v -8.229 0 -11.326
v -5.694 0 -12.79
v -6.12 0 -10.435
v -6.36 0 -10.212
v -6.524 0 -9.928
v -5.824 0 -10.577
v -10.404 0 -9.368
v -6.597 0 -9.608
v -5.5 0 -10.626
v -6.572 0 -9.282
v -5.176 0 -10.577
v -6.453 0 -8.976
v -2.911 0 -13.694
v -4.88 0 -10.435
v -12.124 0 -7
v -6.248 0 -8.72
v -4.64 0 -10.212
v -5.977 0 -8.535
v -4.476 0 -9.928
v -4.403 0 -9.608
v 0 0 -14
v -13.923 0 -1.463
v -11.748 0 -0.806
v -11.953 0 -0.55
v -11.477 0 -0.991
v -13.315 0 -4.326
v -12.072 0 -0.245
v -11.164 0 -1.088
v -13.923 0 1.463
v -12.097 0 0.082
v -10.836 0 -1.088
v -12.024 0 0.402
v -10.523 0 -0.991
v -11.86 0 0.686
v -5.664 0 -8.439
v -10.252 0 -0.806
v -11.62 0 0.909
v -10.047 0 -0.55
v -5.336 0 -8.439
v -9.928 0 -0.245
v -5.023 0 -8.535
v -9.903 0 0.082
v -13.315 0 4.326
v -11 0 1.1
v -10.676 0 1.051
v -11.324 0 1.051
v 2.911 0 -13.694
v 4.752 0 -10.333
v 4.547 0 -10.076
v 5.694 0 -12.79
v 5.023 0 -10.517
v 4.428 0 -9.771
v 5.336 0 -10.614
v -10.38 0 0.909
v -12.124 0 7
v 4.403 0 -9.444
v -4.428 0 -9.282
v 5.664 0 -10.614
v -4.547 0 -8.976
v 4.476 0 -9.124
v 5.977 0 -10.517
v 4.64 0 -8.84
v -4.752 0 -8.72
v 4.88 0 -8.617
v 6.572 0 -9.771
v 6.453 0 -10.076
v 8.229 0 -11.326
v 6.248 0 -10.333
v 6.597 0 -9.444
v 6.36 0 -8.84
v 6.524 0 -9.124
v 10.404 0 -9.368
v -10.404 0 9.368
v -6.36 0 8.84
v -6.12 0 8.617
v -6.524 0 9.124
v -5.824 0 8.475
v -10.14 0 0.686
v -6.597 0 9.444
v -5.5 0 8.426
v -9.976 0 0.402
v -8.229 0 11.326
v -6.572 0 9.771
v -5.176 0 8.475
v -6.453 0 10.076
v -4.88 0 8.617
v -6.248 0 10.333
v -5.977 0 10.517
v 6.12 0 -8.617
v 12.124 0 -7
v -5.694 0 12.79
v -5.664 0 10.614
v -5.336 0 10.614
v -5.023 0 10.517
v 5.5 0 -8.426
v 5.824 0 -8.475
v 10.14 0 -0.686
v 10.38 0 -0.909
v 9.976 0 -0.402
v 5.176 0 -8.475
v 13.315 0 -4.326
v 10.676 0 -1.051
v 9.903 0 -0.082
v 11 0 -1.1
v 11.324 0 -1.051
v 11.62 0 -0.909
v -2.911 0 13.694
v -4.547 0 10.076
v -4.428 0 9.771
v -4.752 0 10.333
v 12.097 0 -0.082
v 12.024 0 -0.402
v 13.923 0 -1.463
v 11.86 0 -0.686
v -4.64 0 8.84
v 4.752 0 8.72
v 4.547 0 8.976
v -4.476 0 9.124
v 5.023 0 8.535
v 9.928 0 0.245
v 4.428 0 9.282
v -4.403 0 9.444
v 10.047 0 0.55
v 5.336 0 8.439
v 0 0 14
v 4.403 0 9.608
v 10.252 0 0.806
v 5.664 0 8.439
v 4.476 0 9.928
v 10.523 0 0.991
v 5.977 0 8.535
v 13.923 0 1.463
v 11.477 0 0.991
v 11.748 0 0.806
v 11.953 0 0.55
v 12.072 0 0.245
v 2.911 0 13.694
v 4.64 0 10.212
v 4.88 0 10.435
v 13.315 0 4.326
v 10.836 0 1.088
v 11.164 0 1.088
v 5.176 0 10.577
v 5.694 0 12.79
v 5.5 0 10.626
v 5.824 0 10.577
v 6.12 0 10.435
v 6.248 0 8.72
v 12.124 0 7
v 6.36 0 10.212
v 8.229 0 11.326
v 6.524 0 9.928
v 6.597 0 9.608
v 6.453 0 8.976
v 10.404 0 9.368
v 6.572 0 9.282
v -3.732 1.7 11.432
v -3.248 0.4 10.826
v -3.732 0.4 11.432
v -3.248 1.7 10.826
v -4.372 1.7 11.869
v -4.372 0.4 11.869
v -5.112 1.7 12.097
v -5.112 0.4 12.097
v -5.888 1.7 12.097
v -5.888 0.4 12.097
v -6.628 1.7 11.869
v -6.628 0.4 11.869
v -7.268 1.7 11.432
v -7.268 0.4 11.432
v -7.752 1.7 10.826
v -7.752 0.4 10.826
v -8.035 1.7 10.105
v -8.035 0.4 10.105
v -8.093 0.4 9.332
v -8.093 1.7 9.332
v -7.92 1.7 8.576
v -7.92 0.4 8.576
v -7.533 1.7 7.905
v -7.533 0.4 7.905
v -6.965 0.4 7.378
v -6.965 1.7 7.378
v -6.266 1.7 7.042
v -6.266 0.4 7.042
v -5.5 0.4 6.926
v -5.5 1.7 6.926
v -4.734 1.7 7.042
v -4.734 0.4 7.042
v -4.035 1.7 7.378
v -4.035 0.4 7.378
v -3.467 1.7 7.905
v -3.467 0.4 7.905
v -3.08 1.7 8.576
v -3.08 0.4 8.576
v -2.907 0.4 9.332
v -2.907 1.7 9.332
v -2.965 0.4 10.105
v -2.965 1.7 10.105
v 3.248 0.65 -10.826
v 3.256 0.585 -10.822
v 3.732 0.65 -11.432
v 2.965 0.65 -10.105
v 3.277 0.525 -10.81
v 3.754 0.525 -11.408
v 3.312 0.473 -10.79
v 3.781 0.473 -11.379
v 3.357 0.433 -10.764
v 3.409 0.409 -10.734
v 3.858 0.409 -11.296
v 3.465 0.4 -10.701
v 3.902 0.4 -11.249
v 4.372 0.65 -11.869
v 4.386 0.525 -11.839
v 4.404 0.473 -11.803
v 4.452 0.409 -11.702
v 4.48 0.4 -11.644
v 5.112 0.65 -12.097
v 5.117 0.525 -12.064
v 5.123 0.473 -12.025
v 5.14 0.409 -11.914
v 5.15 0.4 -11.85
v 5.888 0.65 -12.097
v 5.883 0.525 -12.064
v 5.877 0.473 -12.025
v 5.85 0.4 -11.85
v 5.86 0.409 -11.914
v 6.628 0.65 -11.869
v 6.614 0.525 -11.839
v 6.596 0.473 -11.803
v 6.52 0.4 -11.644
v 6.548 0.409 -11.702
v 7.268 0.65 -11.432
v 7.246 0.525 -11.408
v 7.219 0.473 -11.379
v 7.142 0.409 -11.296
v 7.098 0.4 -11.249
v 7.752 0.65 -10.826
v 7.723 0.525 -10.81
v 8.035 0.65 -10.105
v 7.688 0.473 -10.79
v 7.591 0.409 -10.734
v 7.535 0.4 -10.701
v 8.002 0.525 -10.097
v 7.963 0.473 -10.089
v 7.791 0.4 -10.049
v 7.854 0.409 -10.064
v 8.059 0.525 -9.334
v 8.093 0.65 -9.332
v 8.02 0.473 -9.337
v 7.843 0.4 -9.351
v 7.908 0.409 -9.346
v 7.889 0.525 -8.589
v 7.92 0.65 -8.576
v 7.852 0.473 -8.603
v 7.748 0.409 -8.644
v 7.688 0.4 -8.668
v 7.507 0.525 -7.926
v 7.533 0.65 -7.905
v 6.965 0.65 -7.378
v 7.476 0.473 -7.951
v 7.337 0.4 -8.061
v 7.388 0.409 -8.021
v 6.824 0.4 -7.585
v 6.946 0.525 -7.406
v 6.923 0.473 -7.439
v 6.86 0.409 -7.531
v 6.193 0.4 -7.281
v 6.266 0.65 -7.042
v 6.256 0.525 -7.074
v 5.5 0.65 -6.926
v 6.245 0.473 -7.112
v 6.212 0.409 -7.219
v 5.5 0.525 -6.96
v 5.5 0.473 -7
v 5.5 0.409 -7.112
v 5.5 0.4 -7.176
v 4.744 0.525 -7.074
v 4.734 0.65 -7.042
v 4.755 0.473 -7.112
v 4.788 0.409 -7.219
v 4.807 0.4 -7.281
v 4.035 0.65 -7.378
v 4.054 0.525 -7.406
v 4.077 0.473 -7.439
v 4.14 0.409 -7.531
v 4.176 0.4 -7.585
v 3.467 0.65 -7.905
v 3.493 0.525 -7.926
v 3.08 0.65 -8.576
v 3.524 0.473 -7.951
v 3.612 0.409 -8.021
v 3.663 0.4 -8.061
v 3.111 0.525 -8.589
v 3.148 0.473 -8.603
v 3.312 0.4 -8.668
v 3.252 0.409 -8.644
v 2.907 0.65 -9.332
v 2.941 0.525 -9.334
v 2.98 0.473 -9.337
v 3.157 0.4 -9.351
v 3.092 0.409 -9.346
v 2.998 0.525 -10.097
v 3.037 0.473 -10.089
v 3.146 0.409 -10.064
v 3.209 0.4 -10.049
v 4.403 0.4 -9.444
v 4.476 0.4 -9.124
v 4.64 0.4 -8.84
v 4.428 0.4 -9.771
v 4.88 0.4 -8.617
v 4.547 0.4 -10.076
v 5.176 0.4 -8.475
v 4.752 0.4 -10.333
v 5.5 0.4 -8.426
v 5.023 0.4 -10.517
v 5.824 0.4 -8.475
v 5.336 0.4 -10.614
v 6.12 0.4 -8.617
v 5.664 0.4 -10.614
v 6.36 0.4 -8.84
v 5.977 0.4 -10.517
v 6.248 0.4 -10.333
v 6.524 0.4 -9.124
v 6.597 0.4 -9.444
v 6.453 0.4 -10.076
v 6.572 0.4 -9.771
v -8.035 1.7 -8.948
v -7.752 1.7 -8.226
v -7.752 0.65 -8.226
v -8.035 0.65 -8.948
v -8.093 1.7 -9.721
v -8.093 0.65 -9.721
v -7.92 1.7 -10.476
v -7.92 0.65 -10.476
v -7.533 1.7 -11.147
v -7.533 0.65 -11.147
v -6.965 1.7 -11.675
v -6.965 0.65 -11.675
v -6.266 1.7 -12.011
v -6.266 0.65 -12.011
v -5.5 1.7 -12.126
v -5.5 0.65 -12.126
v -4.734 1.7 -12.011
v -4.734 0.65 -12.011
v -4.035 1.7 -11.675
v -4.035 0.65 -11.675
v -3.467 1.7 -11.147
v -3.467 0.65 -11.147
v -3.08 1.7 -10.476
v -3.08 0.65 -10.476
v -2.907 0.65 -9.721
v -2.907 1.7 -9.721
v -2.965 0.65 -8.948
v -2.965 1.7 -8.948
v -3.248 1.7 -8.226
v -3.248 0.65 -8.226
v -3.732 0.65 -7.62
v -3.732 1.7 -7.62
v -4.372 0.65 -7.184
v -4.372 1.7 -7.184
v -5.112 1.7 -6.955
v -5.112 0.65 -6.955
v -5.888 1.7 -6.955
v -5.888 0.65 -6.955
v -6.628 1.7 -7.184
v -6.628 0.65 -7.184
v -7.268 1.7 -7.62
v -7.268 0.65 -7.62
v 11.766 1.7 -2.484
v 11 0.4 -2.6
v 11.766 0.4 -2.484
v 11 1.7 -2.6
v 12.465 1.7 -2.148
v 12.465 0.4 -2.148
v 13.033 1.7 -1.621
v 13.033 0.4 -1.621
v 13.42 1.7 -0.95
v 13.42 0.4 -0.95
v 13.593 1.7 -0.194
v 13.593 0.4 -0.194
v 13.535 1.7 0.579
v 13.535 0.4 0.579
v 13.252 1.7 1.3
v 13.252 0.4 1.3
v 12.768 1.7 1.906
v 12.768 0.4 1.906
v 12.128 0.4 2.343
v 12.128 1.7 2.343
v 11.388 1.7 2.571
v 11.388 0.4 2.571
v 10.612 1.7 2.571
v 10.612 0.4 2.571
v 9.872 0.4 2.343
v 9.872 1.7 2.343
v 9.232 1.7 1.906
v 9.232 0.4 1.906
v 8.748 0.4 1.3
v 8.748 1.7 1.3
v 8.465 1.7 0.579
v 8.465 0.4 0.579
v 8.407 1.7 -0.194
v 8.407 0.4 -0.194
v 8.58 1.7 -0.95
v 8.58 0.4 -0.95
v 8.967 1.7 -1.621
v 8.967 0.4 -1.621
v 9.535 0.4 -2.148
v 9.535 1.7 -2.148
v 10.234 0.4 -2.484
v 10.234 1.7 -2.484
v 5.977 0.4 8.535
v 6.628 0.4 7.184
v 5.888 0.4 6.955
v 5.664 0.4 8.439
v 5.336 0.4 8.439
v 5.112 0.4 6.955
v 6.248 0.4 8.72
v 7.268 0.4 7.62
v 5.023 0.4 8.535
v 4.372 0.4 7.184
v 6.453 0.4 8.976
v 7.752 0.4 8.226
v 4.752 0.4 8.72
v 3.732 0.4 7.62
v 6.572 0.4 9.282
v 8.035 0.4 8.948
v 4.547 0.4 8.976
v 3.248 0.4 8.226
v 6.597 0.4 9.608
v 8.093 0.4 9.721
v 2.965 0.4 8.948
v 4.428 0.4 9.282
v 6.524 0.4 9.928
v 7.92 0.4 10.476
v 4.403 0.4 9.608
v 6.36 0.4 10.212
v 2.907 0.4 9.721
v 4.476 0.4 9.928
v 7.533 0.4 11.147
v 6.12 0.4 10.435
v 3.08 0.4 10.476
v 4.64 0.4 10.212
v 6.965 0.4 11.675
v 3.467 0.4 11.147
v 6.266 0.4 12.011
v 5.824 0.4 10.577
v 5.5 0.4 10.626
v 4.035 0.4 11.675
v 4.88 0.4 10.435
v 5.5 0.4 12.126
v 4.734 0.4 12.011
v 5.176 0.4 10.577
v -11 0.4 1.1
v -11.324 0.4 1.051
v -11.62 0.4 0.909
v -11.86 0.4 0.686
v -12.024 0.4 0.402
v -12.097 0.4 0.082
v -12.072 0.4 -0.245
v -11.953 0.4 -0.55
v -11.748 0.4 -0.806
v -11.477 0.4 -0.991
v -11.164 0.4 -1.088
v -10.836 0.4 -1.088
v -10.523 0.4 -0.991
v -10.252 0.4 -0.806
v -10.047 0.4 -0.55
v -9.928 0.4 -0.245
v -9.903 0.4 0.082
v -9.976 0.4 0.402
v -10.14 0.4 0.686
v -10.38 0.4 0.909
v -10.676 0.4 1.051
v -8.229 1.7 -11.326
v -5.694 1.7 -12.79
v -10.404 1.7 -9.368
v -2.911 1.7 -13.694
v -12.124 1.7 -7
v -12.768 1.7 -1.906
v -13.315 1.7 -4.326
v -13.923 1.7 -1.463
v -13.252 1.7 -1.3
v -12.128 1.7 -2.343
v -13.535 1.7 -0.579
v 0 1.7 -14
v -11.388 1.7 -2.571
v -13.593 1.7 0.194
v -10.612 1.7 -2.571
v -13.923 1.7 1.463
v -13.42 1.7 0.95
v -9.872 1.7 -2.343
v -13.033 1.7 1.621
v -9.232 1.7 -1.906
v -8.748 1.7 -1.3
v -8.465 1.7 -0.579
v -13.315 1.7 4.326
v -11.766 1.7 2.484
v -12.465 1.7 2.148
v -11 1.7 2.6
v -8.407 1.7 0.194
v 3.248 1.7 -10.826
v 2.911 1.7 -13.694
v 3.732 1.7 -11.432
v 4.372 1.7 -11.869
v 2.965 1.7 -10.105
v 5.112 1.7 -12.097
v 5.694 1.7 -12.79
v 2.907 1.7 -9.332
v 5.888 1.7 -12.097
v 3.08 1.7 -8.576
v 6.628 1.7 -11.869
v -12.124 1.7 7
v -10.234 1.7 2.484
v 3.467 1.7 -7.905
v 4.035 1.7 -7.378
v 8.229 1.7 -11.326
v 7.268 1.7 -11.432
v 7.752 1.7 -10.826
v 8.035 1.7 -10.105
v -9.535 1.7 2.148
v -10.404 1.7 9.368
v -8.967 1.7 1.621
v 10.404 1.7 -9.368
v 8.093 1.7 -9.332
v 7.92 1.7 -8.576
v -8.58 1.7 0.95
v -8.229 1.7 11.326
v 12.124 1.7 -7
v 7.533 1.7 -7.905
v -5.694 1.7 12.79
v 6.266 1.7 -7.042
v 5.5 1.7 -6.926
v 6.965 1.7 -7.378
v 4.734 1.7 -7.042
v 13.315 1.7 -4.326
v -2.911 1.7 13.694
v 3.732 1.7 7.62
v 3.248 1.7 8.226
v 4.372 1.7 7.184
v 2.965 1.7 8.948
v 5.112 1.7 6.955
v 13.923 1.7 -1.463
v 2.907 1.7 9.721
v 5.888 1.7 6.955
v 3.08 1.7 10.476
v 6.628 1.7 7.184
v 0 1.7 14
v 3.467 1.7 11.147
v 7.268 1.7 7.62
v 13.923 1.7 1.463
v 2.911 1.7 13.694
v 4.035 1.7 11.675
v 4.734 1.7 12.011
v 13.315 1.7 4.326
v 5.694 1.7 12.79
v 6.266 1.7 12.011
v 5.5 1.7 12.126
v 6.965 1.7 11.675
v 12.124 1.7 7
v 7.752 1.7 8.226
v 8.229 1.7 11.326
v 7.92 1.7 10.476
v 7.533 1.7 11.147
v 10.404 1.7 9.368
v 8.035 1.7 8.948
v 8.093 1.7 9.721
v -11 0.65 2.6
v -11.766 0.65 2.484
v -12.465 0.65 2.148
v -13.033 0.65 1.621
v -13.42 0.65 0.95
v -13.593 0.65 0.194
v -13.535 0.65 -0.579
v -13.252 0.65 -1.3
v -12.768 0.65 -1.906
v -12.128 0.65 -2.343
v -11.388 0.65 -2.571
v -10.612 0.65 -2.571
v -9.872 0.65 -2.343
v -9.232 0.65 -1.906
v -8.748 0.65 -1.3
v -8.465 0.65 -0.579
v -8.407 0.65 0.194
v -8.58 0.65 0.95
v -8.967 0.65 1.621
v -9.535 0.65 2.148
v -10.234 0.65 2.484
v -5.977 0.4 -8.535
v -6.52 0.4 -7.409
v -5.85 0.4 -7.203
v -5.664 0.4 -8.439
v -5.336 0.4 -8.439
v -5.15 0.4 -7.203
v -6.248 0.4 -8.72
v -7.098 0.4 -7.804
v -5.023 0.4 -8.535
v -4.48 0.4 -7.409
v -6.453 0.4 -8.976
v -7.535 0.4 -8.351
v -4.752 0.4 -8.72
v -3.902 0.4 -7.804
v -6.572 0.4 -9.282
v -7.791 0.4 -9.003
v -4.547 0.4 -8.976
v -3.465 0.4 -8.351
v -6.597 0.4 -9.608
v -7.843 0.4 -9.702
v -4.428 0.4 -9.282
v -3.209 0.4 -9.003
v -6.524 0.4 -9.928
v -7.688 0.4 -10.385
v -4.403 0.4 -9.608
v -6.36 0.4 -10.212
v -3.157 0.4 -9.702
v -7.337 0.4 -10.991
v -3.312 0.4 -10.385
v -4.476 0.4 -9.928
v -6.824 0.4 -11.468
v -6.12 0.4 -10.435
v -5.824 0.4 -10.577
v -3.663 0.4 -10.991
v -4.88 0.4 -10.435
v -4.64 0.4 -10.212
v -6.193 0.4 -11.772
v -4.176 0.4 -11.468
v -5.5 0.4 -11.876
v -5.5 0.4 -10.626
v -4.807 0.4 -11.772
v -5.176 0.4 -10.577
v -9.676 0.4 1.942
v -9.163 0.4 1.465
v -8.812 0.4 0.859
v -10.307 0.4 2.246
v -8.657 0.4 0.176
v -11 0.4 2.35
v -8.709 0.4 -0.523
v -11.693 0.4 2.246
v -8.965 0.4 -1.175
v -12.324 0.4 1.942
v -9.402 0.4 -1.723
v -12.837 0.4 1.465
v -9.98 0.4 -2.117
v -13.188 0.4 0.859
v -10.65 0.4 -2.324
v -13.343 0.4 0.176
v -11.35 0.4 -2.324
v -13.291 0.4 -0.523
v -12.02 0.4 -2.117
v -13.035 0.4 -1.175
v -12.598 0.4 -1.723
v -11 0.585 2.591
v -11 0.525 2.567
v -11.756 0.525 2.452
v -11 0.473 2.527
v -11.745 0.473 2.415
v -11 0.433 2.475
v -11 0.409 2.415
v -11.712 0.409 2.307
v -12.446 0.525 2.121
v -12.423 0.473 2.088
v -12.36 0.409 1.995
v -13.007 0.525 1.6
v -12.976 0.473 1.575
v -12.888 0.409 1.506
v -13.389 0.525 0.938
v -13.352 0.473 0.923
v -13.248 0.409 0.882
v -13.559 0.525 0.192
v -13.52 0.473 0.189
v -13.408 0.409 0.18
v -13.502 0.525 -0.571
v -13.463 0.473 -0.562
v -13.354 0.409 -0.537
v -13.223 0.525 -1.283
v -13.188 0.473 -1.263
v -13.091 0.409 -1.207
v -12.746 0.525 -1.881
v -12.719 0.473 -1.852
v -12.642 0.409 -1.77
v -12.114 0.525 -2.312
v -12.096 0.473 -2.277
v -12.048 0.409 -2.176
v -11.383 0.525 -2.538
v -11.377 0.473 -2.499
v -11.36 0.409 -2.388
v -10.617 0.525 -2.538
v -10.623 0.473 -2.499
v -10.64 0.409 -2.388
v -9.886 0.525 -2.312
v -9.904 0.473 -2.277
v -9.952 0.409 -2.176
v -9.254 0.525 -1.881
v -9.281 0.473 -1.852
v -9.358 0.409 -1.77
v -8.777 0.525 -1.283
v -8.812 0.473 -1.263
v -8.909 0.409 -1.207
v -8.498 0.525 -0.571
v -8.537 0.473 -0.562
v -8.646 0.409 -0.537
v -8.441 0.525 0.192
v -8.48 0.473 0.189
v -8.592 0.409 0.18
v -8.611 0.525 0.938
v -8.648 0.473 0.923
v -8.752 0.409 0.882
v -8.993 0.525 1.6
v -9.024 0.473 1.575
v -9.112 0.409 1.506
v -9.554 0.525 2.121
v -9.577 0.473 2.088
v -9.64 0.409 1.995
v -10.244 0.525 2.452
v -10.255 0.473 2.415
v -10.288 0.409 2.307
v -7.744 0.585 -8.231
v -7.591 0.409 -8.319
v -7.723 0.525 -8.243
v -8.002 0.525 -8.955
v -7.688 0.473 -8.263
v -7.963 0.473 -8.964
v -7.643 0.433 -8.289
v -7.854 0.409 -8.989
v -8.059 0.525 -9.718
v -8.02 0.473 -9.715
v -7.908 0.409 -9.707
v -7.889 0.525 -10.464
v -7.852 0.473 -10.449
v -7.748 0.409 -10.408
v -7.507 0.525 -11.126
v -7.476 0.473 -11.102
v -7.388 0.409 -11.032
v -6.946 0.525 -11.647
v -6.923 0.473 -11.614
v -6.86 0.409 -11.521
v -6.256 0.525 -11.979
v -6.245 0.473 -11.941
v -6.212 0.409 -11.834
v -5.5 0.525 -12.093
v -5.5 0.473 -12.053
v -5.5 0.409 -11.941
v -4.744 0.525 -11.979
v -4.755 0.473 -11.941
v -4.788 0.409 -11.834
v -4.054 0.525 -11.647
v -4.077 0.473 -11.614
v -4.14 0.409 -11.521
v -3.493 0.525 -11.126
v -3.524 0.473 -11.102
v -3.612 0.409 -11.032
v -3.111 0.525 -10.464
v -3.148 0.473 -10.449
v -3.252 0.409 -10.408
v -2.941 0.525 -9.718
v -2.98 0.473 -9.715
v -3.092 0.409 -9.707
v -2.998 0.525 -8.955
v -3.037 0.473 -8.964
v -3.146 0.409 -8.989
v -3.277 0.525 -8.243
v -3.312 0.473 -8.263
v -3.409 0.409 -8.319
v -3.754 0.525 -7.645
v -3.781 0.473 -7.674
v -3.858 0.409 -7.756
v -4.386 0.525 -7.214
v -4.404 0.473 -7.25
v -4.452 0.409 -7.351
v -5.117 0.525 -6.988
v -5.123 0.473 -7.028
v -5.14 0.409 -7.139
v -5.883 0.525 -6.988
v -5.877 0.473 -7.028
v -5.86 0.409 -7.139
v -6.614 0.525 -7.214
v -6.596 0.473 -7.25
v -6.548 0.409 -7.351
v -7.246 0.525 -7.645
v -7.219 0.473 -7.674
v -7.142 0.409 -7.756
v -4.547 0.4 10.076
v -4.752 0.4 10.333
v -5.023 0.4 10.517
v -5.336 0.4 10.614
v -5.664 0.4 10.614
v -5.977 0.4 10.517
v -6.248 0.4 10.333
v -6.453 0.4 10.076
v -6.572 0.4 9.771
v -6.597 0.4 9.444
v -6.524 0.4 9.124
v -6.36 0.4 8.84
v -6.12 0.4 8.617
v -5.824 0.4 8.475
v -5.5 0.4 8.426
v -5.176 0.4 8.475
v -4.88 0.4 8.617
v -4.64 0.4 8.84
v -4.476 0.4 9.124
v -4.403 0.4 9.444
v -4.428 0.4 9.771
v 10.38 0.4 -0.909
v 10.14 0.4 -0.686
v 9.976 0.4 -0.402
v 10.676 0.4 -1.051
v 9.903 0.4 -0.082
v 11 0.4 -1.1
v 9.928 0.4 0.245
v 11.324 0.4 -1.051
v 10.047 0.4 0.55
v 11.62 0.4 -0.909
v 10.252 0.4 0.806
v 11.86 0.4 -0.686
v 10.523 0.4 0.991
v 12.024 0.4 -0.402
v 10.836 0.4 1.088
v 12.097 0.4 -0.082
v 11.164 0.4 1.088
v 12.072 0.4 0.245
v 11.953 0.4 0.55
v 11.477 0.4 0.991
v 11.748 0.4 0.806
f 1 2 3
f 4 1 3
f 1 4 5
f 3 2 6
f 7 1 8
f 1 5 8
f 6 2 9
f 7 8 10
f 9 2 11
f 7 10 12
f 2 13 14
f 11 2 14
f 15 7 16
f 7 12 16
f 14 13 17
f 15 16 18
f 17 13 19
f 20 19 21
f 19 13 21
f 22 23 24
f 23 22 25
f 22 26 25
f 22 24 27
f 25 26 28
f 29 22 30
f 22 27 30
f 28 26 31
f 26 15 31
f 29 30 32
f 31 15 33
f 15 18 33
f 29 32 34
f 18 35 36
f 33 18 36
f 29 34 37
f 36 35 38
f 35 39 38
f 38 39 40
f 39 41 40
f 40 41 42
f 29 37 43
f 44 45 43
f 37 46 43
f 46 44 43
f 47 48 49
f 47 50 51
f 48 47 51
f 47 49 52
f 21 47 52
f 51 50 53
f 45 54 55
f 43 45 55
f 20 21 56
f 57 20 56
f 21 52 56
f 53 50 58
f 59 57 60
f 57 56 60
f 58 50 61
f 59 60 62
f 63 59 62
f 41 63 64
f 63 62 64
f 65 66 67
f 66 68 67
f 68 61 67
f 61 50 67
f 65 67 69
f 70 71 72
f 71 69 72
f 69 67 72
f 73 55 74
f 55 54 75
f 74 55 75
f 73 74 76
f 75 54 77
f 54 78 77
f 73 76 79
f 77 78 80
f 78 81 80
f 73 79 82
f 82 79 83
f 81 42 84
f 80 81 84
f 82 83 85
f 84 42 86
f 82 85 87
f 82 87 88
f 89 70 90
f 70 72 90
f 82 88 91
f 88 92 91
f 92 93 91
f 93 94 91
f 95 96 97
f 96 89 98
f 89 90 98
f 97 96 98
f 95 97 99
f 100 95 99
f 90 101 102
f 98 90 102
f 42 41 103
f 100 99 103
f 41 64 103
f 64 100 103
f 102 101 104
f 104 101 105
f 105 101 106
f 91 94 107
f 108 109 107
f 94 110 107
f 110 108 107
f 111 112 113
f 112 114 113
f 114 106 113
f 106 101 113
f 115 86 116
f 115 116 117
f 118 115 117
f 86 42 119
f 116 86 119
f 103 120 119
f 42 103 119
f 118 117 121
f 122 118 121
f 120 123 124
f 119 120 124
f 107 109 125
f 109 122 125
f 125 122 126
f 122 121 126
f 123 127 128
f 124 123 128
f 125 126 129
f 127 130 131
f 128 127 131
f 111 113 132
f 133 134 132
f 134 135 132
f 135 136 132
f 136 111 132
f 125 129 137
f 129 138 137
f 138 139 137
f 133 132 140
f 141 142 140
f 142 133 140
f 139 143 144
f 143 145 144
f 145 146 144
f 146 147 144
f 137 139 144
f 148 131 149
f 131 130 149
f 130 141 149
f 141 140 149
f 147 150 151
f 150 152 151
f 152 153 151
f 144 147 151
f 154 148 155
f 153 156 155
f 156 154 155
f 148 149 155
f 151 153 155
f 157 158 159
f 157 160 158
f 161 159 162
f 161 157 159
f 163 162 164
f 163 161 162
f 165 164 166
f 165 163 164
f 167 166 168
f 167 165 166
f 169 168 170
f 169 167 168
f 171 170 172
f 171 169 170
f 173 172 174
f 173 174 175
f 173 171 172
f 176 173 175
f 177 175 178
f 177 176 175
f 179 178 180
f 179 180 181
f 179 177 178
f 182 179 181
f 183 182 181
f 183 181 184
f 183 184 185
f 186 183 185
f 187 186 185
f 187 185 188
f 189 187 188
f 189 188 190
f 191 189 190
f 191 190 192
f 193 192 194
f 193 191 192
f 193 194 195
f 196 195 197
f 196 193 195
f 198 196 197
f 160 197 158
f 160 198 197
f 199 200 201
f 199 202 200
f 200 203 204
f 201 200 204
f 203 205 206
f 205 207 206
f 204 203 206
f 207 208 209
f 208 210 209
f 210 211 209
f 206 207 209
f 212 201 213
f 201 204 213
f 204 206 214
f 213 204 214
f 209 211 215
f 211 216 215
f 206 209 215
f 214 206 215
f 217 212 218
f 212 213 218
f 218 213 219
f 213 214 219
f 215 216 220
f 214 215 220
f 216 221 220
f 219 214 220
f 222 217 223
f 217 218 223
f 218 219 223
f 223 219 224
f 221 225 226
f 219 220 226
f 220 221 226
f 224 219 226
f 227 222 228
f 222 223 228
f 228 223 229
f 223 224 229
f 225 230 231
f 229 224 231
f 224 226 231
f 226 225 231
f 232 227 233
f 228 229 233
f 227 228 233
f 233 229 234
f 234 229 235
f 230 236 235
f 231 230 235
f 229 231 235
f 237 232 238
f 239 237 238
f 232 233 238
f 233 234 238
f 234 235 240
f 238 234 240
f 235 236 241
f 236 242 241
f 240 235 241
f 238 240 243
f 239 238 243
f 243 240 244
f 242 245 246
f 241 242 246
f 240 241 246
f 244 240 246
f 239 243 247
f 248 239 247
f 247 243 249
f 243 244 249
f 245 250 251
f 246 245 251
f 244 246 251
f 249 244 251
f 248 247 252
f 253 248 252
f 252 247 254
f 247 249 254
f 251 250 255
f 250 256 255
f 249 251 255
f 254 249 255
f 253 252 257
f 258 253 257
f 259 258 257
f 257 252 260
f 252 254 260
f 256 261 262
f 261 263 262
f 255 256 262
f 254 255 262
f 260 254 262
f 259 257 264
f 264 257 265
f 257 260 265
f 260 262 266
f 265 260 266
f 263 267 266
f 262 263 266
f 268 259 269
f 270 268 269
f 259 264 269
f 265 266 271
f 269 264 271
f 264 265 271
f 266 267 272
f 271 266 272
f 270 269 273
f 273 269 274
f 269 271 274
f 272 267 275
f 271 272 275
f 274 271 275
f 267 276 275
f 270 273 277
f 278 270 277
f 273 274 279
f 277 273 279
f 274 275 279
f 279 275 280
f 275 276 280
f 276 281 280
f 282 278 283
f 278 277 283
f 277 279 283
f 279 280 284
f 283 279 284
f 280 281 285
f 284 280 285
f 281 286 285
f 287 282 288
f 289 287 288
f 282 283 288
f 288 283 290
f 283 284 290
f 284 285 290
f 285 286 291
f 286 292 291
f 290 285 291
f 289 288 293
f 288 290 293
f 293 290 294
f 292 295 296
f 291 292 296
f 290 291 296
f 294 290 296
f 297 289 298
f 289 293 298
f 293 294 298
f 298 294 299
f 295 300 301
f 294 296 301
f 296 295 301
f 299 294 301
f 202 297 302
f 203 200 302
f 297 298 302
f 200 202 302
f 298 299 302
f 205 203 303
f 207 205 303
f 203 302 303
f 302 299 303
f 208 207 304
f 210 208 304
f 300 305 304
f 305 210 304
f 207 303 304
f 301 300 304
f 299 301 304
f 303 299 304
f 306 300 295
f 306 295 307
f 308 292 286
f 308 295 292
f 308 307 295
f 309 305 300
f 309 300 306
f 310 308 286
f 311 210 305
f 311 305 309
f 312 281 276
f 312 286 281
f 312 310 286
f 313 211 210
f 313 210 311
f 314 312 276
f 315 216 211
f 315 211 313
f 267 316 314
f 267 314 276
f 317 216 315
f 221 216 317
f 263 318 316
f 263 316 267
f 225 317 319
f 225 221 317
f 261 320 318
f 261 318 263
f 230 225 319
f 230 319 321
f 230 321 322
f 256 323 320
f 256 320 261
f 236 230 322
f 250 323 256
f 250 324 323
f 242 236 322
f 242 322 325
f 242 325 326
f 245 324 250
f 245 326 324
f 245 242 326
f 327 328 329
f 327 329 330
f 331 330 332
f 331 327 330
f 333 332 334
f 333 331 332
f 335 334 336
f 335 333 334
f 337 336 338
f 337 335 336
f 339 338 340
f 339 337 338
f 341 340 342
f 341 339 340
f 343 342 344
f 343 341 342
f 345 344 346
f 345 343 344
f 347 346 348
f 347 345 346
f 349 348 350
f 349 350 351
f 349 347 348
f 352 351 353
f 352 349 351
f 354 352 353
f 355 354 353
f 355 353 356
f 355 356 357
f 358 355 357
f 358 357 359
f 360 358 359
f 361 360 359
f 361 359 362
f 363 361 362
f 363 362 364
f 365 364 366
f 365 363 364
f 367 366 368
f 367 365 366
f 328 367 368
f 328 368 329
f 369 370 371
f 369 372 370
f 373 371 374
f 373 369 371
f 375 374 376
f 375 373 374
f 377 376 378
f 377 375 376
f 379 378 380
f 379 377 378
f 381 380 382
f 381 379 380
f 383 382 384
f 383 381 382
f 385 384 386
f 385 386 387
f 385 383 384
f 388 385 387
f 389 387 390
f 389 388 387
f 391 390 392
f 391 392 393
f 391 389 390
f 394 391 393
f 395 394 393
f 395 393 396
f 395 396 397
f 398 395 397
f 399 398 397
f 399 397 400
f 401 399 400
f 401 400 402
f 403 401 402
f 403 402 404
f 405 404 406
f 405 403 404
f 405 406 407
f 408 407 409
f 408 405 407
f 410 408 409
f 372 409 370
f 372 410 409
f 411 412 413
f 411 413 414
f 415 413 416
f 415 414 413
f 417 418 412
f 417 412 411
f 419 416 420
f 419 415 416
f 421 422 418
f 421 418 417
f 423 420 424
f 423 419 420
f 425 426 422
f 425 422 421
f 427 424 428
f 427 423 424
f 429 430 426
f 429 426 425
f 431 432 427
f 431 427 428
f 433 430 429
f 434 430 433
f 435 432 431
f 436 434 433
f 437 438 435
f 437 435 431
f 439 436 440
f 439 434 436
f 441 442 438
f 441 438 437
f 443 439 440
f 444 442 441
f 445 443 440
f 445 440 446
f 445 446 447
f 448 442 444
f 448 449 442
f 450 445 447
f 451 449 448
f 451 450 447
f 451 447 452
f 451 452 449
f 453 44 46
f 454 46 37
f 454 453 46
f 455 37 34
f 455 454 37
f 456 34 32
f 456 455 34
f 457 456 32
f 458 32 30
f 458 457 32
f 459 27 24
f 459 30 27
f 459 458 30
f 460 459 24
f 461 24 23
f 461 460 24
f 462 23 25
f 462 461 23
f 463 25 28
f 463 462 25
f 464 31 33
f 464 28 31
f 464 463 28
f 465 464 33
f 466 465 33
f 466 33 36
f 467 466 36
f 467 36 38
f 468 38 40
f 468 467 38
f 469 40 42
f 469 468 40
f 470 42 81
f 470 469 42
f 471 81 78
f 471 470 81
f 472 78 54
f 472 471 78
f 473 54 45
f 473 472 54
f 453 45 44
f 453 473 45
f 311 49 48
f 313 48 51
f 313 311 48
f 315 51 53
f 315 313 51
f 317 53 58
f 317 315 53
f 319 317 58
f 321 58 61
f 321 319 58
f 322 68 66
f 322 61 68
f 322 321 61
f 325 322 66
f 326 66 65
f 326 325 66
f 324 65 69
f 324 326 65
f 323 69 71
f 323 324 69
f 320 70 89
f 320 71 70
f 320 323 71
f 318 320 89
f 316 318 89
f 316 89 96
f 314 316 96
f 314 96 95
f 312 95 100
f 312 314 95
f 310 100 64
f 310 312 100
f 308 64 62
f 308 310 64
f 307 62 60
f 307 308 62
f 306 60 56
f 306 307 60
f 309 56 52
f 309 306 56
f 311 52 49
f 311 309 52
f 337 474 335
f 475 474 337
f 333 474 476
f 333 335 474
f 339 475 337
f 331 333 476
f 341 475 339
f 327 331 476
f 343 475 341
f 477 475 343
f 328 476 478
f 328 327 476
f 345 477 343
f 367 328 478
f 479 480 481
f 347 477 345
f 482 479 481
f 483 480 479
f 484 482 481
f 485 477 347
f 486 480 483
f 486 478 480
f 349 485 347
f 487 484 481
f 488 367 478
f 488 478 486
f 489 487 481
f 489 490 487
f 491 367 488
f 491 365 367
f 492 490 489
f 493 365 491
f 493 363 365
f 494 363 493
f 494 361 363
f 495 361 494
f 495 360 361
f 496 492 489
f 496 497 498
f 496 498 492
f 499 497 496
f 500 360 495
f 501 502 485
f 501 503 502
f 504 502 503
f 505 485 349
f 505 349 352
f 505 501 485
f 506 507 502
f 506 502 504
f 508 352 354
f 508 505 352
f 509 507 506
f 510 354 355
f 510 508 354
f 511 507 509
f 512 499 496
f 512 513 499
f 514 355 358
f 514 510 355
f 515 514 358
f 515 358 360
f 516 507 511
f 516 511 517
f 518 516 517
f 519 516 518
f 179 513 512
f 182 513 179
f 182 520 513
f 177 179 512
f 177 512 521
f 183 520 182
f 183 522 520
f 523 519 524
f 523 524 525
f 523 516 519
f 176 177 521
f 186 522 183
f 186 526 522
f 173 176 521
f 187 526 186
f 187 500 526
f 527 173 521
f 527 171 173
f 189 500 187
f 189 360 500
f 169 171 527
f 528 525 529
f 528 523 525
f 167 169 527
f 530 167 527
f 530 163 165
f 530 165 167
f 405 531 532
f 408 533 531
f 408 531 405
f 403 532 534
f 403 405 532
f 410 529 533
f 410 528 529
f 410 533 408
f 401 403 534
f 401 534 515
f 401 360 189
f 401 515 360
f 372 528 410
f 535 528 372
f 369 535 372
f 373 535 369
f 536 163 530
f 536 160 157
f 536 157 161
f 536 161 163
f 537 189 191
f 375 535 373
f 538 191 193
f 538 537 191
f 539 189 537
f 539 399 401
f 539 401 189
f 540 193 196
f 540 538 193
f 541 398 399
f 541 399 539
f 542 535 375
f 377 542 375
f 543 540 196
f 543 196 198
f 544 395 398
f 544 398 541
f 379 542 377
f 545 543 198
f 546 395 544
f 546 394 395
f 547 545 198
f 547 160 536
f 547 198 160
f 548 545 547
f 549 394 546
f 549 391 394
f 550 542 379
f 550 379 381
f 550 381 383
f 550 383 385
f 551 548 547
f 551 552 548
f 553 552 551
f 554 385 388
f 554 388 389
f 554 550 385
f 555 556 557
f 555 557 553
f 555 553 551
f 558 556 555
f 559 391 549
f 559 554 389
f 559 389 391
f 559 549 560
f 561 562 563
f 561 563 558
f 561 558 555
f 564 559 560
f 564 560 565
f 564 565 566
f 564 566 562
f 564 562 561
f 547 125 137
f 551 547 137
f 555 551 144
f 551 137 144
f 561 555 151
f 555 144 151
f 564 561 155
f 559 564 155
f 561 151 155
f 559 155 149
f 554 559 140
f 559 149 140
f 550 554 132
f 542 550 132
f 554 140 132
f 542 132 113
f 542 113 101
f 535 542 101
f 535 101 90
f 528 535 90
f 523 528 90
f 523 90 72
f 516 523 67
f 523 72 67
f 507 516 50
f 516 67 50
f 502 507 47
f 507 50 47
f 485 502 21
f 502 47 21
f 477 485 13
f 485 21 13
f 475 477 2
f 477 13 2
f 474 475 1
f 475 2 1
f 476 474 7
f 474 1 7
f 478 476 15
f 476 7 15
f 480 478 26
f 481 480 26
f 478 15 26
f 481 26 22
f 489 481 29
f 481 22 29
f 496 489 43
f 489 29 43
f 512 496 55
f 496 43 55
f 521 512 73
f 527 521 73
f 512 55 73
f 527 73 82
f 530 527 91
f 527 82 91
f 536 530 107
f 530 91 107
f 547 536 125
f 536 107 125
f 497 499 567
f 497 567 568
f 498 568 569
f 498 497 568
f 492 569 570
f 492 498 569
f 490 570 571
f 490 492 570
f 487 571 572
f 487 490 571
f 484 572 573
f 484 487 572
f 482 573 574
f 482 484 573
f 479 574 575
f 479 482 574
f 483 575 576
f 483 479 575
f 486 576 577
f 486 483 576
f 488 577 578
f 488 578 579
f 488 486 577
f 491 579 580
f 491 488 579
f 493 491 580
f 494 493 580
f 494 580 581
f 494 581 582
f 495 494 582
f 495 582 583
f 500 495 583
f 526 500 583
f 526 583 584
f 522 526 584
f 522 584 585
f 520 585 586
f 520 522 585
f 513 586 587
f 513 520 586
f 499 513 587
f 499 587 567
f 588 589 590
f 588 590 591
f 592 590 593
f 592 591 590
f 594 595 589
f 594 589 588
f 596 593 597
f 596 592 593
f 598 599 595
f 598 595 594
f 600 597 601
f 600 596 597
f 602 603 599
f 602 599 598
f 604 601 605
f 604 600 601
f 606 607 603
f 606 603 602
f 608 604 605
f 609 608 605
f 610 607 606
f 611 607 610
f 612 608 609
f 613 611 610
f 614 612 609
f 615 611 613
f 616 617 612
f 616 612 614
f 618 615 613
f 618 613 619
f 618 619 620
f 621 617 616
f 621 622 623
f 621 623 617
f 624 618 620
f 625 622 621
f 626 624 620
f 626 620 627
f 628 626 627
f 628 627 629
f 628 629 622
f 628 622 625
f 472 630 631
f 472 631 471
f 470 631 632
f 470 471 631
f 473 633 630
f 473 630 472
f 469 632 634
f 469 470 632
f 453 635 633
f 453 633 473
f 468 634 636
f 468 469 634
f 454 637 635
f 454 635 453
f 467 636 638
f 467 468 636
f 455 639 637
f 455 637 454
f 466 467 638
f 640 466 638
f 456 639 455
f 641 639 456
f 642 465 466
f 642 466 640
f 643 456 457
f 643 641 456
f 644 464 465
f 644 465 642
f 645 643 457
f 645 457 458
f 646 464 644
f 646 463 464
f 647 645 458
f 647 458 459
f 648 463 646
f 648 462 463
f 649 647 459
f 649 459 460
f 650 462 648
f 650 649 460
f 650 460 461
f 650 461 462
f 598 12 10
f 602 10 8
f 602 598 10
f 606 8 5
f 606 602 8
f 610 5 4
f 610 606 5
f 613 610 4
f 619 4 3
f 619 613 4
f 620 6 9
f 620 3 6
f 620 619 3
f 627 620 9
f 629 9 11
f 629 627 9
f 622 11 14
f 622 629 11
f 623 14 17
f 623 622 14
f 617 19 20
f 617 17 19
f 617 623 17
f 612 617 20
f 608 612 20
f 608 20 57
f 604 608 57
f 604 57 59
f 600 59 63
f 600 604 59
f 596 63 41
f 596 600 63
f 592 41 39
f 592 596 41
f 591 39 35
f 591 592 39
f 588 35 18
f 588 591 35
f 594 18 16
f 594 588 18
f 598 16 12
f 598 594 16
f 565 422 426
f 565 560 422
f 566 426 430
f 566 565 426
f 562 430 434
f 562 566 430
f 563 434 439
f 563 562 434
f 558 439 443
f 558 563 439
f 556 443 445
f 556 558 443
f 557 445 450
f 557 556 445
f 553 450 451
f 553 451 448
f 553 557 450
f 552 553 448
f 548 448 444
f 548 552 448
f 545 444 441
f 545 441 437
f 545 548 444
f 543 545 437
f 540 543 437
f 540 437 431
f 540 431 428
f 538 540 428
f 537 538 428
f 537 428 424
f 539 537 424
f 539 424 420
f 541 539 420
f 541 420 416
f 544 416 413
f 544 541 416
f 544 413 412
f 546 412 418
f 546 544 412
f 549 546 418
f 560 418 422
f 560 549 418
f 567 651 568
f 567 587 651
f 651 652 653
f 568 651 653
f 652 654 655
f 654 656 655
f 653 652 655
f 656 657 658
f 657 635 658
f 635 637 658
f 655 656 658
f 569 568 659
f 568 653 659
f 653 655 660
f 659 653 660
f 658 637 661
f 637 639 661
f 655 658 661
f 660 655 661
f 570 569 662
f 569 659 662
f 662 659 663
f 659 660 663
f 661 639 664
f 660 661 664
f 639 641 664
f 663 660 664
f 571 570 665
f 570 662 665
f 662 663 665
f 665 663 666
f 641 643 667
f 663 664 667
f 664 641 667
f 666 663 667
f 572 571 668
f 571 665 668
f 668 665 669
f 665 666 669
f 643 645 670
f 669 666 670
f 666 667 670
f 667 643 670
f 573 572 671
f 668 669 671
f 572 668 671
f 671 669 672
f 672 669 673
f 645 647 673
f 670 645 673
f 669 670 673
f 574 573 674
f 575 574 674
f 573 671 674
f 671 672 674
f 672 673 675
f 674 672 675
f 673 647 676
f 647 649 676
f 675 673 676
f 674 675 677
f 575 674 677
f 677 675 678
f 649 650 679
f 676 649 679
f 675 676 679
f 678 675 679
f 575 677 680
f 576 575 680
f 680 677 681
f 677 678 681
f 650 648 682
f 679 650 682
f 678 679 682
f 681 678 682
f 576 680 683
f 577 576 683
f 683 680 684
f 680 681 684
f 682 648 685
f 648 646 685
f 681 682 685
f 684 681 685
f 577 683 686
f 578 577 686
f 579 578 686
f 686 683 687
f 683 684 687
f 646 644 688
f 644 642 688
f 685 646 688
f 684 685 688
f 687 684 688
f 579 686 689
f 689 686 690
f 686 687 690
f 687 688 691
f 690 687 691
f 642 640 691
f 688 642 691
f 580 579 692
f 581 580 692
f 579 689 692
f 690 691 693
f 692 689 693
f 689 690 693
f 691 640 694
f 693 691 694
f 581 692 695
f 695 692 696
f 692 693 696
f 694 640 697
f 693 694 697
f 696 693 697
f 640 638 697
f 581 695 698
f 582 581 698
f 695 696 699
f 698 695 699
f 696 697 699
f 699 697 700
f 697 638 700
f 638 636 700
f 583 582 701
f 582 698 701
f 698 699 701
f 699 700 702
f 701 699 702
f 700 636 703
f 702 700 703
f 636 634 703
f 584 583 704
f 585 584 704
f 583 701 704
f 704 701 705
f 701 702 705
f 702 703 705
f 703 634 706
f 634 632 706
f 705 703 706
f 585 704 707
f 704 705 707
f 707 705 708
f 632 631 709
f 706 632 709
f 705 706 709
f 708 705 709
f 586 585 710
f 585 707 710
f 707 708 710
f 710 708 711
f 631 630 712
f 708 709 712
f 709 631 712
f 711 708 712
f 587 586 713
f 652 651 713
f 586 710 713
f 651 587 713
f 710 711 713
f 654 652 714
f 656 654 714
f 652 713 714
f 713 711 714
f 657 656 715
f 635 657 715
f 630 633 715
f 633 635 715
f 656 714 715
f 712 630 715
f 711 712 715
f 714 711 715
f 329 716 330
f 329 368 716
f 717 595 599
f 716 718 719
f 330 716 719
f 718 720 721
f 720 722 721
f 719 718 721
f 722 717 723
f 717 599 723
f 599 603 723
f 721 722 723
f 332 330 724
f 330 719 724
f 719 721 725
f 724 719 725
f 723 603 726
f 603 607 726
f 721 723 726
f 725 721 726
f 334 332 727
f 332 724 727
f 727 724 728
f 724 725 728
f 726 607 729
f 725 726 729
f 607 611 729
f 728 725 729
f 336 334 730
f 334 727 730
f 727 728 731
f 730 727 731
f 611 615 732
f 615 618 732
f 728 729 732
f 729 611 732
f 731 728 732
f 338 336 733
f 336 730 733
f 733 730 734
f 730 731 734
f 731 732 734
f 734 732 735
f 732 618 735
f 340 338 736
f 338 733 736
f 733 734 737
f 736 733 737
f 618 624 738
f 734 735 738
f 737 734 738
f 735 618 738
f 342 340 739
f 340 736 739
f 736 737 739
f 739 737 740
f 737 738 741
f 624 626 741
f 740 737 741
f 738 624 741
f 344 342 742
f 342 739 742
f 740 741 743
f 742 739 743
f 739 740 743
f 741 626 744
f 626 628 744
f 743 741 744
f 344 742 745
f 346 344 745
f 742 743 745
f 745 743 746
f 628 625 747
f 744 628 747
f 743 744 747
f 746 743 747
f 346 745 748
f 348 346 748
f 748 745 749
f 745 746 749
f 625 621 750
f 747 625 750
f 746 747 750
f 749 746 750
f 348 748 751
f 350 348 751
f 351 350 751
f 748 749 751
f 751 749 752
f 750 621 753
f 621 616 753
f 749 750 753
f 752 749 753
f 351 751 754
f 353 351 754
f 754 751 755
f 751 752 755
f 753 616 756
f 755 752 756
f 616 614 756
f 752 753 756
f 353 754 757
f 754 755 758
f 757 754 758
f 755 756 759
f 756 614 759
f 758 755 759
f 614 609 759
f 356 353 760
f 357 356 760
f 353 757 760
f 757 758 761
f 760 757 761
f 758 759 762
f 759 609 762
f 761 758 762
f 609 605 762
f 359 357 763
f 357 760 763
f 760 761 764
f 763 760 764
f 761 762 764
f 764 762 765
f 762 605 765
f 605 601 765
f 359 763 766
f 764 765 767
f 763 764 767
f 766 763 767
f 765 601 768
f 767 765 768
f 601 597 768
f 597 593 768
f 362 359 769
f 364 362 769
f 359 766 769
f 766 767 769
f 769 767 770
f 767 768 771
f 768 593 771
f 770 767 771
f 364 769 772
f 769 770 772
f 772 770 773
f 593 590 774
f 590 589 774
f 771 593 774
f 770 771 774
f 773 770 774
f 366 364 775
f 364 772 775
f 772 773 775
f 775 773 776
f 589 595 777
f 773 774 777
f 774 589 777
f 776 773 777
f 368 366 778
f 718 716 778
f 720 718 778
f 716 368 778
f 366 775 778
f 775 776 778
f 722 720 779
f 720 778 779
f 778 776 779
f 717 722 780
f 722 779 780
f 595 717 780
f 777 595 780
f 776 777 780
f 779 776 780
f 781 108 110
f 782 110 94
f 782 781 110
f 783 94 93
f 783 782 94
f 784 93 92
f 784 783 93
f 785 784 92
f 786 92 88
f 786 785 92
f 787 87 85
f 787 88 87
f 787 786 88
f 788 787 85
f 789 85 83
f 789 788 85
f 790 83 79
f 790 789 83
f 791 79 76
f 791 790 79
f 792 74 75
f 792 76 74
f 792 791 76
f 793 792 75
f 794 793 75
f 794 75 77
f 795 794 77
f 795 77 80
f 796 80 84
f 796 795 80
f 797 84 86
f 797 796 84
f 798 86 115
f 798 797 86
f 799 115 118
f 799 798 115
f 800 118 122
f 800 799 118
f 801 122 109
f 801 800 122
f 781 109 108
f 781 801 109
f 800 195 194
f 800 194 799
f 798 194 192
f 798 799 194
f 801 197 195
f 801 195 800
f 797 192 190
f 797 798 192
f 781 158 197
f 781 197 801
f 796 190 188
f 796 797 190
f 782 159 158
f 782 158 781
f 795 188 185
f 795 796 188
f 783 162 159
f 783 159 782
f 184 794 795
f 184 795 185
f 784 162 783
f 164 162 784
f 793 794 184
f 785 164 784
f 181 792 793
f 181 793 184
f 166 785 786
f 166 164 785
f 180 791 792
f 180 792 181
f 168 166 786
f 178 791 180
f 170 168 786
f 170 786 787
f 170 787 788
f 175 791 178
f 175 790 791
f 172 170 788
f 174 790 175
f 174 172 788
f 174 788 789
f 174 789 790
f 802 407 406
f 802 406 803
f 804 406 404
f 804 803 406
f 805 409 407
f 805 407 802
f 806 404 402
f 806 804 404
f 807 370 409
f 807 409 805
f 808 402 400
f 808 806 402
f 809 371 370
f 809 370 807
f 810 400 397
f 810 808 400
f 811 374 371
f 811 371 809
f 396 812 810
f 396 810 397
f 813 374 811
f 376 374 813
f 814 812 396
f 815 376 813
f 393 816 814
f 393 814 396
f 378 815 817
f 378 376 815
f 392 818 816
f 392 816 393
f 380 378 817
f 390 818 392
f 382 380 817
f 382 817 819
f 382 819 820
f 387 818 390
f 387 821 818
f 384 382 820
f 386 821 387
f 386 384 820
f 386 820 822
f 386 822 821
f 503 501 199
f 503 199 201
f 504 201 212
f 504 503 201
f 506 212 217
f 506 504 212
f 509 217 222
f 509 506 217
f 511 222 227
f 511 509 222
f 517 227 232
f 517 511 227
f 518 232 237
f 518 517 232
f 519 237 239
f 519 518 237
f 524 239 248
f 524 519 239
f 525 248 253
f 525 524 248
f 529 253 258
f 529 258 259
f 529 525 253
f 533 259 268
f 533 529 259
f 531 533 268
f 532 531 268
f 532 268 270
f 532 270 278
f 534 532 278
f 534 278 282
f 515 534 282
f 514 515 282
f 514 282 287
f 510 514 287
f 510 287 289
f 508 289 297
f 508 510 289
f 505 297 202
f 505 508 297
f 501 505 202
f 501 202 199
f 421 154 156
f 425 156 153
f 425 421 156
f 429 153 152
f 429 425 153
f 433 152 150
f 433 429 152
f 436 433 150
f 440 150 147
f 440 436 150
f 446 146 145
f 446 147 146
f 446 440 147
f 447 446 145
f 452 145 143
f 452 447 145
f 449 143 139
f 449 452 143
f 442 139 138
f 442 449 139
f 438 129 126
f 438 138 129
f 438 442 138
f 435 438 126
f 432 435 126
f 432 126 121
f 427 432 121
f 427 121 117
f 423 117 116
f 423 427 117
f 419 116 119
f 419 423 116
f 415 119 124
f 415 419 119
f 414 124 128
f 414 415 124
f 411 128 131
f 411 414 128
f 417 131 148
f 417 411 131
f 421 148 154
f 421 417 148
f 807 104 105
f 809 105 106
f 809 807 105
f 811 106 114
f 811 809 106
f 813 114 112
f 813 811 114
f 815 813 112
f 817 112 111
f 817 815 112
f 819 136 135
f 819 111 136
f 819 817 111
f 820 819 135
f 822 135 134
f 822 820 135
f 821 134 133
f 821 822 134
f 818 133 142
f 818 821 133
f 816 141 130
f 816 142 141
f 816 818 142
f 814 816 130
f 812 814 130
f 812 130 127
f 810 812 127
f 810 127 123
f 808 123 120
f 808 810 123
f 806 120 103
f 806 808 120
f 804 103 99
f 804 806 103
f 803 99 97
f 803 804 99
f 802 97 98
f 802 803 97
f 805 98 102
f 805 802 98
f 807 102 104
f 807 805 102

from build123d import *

# Parameters (mm, degrees)
SKETCH1_R           = 14
BOSS_EXTRUDE1_DEPTH = 1.7
CIRPATTERN1_COUNT   = 6
FILLET1_R           = 0.25


with BuildPart() as part:
    # Sketch1 → Boss-Extrude1 (new body)
    with BuildSketch(Plane(origin=(0, 0, 0), x_dir=(1, 0, 0), z_dir=(0, 1, 0))):
        with Locations(Location((0, 0, 0), (0, 0, 270))):
            Circle(SKETCH1_R)
    extrude(amount=BOSS_EXTRUDE1_DEPTH)

    # Sketch14 → CBORE for M5 Hex Head Bolt1 (revolve, cut)
    with BuildSketch(Plane(origin=(-11, 1.7, 0), x_dir=(0, 0, 1), z_dir=(1, 0, 0))):
        Polygon((0, 0), (0, 5.660946681), (1.1, 5), (1.1, 1.3), (2.6, 1.3), (2.6, 0), align=None)
    cbore_for_m5_hex_head_bolt1 = revolve(axis=Axis((-11, 8.05, 0), (0, -1, 0)), mode=Mode.SUBTRACT)

    # CirPattern1: CBORE for M5 Hex Head Bolt1 ×6 about axis
    cirpattern1_axis = Axis((0, 0, 0), (0, 1, 0))
    for i in range(1, CIRPATTERN1_COUNT):
        add(cbore_for_m5_hex_head_bolt1.rotate(cirpattern1_axis, i * 360 / CIRPATTERN1_COUNT), mode=Mode.SUBTRACT)

    # Fillet1
    fillet1_edges = [part.edges().sort_by_distance(p)[0] for p in [
        (-3.24833395, 0.4, -10.826279442),
        (7.75166605, 0.4, -8.226279442),
        (-11, 0.4, -2.6),
    ]]
    fillet(fillet1_edges, radius=FILLET1_R)


solid = part.part
